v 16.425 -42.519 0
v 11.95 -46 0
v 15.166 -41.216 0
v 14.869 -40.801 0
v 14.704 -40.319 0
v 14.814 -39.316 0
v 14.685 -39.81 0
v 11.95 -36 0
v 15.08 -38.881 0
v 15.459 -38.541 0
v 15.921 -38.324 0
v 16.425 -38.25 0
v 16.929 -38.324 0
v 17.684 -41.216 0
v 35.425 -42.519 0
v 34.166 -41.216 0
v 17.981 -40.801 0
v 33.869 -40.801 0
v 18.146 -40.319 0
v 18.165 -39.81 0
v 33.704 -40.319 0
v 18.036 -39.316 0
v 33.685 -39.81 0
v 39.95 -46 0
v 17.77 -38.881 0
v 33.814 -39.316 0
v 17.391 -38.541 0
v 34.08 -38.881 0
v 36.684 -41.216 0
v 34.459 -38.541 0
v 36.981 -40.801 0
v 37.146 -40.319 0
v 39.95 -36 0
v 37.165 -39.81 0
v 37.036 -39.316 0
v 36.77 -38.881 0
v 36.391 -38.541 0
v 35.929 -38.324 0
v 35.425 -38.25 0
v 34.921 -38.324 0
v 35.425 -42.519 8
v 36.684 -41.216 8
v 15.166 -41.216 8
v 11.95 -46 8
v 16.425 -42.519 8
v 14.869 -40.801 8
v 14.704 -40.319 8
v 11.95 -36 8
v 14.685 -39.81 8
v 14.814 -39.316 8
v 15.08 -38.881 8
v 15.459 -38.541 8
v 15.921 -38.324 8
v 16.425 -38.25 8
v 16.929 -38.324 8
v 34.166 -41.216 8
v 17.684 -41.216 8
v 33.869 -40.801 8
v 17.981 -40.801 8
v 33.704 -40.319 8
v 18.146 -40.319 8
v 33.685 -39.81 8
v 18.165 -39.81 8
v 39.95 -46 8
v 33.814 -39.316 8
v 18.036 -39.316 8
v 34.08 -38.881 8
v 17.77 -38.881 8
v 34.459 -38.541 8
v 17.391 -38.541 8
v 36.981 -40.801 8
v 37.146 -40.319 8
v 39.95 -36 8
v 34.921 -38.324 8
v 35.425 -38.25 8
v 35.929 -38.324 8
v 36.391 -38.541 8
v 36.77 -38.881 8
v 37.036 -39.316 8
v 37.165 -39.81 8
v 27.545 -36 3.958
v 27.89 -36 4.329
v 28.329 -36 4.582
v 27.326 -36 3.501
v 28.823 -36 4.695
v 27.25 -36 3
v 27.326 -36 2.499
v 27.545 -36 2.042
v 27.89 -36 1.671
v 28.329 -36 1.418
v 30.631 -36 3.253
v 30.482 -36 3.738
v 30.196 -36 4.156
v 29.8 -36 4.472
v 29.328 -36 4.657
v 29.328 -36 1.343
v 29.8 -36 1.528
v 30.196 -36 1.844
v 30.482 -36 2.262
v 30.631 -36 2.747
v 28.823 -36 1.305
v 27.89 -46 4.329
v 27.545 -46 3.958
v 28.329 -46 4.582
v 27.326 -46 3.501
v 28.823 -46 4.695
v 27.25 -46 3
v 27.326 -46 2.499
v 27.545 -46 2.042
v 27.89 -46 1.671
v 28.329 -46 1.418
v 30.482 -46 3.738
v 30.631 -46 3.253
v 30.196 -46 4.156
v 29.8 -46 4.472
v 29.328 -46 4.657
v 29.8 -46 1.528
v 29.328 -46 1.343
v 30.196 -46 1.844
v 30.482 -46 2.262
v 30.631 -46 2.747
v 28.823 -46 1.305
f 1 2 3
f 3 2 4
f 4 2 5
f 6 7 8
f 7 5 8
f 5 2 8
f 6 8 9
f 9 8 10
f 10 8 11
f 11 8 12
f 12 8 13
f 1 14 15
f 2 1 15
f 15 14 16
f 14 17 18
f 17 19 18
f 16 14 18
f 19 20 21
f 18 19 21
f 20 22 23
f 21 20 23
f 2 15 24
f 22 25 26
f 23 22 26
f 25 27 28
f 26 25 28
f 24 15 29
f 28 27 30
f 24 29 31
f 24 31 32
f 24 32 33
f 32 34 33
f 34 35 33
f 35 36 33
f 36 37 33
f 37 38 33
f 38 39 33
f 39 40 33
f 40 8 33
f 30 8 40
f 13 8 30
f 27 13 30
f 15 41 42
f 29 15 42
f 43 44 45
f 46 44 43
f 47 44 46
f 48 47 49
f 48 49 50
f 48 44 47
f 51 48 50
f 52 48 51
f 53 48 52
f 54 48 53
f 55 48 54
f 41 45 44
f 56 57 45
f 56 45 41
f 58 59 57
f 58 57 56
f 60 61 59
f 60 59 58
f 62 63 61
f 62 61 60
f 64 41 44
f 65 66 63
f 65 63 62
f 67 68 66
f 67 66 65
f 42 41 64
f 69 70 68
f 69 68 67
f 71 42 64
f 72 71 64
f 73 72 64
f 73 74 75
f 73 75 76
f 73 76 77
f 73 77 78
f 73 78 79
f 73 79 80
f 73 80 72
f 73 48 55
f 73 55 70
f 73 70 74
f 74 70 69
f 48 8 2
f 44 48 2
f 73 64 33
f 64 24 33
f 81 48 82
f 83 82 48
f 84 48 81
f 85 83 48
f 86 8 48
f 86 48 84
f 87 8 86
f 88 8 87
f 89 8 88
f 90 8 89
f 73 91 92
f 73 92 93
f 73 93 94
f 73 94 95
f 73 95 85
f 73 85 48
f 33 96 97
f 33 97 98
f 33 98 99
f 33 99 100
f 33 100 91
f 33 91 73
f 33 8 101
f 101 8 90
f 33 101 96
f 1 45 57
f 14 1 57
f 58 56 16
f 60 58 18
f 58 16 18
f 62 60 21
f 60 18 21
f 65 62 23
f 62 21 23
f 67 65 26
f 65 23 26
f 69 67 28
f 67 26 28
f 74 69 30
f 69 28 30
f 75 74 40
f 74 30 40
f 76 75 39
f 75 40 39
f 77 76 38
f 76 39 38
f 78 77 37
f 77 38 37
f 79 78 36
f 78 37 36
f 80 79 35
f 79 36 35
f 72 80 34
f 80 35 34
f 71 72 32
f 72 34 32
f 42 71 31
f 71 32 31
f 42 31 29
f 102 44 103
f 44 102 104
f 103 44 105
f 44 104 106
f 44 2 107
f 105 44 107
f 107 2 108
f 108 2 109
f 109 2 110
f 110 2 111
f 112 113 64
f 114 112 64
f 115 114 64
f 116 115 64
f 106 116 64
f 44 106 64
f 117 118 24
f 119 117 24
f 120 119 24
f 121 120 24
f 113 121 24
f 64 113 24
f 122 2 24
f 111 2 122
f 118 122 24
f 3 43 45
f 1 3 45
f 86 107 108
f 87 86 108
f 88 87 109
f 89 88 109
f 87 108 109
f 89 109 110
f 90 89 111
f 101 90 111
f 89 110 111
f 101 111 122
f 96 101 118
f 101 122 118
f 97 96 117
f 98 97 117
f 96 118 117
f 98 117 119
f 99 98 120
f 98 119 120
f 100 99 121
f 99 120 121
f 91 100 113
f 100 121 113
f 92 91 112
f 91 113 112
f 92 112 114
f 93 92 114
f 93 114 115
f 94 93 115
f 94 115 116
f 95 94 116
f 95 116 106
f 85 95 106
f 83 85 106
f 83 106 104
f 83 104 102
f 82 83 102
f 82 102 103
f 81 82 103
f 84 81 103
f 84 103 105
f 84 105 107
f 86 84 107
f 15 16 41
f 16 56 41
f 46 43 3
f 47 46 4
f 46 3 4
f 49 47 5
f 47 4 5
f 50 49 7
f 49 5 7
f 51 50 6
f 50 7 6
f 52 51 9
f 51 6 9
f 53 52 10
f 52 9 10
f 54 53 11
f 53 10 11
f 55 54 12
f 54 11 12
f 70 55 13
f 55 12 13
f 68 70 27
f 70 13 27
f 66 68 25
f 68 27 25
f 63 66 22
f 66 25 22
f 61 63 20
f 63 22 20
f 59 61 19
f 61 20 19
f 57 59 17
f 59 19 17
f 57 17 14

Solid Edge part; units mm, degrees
sketch "Sketch1" plane through (0, 0, 0) normal (0, 0, 1) x (1, 0, 0)
  circle A0 centre (35.425, -40) radius 1.75
  line L0 (11.95, -46) -> (39.95, -46)
  line L1 (39.95, -46) -> (39.95, -36)
  line L2 (11.95, -36) -> (39.95, -36)
  line L3 (11.95, -36) -> (11.95, -46)
  circle A1 centre (16.425, -40) radius 1.75
  dimension "D1" = 3.5
  dimension "D2" = 3.5
extrude "Protrusion1" add sketch "Sketch1" along normal blind 8
sketch "Sketch2" plane through (25.95, -46, 4) normal (0, -1, 0) x (-1, 0, 0)
  circle A0 centre (-3, 1) radius 1.7
  dimension "D1" = 3.4
  dimension "D2" = 5
  dimension "D3" = 11
extrude "Cutout1" cut sketch "Sketch2" against normal through all
sketch "Sketch3" plane through (25.95, -41, 8) normal (0, 0, 1) x (-1, 0, 0)
  line L0 (-9.475, -1) -> (-8.2162, 0.2157)
  line L1 (-8.2162, 0.2157) -> (-9.475, 1.5192)
  line L2 (-9.475, 1.5192) -> (-10.7338, 0.2157)
  line L3 (-10.7338, 0.2157) -> (-9.475, -1)
  line L4 (9.525, -1) -> (10.7838, 0.2157)
  line L5 (10.7838, 0.2157) -> (9.525, 1.5192)
  line L6 (9.525, 1.5192) -> (8.2662, 0.2157)
  line L7 (8.2662, 0.2157) -> (9.525, -1)
extrude "Cutout2" cut sketch "Sketch3" against normal through all
